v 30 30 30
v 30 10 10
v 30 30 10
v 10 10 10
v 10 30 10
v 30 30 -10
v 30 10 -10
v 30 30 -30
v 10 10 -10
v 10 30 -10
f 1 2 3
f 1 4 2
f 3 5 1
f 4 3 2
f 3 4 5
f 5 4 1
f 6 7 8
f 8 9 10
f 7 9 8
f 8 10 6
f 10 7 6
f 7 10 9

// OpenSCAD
// Unit of length: Unit.MM
union()
{
   translate(v = [10.0, 10.0, 10.0])
   {
      polyhedron(points = [[20.0, 20.0, 0.0], [20.0, 0.0, 0.0], [20.0, 20.0, 20.0], [0.0, 0.0, 0.0], [0.0, 20.0, 0.0]], faces = [[0, 1, 2], [1, 3, 2], [3, 4, 2], [4, 0, 2], [1, 0, 4], [3, 1, 4]]);
   }
   mirror(v = [0.0, 0.0, 1.0])
   {
      translate(v = [10.0, 10.0, 10.0])
      {
         polyhedron(points = [[20.0, 20.0, 0.0], [20.0, 0.0, 0.0], [20.0, 20.0, 20.0], [0.0, 0.0, 0.0], [0.0, 20.0, 0.0]], faces = [[0, 1, 2], [1, 3, 2], [3, 4, 2], [4, 0, 2], [1, 0, 4], [3, 1, 4]]);
      }
   }
}
